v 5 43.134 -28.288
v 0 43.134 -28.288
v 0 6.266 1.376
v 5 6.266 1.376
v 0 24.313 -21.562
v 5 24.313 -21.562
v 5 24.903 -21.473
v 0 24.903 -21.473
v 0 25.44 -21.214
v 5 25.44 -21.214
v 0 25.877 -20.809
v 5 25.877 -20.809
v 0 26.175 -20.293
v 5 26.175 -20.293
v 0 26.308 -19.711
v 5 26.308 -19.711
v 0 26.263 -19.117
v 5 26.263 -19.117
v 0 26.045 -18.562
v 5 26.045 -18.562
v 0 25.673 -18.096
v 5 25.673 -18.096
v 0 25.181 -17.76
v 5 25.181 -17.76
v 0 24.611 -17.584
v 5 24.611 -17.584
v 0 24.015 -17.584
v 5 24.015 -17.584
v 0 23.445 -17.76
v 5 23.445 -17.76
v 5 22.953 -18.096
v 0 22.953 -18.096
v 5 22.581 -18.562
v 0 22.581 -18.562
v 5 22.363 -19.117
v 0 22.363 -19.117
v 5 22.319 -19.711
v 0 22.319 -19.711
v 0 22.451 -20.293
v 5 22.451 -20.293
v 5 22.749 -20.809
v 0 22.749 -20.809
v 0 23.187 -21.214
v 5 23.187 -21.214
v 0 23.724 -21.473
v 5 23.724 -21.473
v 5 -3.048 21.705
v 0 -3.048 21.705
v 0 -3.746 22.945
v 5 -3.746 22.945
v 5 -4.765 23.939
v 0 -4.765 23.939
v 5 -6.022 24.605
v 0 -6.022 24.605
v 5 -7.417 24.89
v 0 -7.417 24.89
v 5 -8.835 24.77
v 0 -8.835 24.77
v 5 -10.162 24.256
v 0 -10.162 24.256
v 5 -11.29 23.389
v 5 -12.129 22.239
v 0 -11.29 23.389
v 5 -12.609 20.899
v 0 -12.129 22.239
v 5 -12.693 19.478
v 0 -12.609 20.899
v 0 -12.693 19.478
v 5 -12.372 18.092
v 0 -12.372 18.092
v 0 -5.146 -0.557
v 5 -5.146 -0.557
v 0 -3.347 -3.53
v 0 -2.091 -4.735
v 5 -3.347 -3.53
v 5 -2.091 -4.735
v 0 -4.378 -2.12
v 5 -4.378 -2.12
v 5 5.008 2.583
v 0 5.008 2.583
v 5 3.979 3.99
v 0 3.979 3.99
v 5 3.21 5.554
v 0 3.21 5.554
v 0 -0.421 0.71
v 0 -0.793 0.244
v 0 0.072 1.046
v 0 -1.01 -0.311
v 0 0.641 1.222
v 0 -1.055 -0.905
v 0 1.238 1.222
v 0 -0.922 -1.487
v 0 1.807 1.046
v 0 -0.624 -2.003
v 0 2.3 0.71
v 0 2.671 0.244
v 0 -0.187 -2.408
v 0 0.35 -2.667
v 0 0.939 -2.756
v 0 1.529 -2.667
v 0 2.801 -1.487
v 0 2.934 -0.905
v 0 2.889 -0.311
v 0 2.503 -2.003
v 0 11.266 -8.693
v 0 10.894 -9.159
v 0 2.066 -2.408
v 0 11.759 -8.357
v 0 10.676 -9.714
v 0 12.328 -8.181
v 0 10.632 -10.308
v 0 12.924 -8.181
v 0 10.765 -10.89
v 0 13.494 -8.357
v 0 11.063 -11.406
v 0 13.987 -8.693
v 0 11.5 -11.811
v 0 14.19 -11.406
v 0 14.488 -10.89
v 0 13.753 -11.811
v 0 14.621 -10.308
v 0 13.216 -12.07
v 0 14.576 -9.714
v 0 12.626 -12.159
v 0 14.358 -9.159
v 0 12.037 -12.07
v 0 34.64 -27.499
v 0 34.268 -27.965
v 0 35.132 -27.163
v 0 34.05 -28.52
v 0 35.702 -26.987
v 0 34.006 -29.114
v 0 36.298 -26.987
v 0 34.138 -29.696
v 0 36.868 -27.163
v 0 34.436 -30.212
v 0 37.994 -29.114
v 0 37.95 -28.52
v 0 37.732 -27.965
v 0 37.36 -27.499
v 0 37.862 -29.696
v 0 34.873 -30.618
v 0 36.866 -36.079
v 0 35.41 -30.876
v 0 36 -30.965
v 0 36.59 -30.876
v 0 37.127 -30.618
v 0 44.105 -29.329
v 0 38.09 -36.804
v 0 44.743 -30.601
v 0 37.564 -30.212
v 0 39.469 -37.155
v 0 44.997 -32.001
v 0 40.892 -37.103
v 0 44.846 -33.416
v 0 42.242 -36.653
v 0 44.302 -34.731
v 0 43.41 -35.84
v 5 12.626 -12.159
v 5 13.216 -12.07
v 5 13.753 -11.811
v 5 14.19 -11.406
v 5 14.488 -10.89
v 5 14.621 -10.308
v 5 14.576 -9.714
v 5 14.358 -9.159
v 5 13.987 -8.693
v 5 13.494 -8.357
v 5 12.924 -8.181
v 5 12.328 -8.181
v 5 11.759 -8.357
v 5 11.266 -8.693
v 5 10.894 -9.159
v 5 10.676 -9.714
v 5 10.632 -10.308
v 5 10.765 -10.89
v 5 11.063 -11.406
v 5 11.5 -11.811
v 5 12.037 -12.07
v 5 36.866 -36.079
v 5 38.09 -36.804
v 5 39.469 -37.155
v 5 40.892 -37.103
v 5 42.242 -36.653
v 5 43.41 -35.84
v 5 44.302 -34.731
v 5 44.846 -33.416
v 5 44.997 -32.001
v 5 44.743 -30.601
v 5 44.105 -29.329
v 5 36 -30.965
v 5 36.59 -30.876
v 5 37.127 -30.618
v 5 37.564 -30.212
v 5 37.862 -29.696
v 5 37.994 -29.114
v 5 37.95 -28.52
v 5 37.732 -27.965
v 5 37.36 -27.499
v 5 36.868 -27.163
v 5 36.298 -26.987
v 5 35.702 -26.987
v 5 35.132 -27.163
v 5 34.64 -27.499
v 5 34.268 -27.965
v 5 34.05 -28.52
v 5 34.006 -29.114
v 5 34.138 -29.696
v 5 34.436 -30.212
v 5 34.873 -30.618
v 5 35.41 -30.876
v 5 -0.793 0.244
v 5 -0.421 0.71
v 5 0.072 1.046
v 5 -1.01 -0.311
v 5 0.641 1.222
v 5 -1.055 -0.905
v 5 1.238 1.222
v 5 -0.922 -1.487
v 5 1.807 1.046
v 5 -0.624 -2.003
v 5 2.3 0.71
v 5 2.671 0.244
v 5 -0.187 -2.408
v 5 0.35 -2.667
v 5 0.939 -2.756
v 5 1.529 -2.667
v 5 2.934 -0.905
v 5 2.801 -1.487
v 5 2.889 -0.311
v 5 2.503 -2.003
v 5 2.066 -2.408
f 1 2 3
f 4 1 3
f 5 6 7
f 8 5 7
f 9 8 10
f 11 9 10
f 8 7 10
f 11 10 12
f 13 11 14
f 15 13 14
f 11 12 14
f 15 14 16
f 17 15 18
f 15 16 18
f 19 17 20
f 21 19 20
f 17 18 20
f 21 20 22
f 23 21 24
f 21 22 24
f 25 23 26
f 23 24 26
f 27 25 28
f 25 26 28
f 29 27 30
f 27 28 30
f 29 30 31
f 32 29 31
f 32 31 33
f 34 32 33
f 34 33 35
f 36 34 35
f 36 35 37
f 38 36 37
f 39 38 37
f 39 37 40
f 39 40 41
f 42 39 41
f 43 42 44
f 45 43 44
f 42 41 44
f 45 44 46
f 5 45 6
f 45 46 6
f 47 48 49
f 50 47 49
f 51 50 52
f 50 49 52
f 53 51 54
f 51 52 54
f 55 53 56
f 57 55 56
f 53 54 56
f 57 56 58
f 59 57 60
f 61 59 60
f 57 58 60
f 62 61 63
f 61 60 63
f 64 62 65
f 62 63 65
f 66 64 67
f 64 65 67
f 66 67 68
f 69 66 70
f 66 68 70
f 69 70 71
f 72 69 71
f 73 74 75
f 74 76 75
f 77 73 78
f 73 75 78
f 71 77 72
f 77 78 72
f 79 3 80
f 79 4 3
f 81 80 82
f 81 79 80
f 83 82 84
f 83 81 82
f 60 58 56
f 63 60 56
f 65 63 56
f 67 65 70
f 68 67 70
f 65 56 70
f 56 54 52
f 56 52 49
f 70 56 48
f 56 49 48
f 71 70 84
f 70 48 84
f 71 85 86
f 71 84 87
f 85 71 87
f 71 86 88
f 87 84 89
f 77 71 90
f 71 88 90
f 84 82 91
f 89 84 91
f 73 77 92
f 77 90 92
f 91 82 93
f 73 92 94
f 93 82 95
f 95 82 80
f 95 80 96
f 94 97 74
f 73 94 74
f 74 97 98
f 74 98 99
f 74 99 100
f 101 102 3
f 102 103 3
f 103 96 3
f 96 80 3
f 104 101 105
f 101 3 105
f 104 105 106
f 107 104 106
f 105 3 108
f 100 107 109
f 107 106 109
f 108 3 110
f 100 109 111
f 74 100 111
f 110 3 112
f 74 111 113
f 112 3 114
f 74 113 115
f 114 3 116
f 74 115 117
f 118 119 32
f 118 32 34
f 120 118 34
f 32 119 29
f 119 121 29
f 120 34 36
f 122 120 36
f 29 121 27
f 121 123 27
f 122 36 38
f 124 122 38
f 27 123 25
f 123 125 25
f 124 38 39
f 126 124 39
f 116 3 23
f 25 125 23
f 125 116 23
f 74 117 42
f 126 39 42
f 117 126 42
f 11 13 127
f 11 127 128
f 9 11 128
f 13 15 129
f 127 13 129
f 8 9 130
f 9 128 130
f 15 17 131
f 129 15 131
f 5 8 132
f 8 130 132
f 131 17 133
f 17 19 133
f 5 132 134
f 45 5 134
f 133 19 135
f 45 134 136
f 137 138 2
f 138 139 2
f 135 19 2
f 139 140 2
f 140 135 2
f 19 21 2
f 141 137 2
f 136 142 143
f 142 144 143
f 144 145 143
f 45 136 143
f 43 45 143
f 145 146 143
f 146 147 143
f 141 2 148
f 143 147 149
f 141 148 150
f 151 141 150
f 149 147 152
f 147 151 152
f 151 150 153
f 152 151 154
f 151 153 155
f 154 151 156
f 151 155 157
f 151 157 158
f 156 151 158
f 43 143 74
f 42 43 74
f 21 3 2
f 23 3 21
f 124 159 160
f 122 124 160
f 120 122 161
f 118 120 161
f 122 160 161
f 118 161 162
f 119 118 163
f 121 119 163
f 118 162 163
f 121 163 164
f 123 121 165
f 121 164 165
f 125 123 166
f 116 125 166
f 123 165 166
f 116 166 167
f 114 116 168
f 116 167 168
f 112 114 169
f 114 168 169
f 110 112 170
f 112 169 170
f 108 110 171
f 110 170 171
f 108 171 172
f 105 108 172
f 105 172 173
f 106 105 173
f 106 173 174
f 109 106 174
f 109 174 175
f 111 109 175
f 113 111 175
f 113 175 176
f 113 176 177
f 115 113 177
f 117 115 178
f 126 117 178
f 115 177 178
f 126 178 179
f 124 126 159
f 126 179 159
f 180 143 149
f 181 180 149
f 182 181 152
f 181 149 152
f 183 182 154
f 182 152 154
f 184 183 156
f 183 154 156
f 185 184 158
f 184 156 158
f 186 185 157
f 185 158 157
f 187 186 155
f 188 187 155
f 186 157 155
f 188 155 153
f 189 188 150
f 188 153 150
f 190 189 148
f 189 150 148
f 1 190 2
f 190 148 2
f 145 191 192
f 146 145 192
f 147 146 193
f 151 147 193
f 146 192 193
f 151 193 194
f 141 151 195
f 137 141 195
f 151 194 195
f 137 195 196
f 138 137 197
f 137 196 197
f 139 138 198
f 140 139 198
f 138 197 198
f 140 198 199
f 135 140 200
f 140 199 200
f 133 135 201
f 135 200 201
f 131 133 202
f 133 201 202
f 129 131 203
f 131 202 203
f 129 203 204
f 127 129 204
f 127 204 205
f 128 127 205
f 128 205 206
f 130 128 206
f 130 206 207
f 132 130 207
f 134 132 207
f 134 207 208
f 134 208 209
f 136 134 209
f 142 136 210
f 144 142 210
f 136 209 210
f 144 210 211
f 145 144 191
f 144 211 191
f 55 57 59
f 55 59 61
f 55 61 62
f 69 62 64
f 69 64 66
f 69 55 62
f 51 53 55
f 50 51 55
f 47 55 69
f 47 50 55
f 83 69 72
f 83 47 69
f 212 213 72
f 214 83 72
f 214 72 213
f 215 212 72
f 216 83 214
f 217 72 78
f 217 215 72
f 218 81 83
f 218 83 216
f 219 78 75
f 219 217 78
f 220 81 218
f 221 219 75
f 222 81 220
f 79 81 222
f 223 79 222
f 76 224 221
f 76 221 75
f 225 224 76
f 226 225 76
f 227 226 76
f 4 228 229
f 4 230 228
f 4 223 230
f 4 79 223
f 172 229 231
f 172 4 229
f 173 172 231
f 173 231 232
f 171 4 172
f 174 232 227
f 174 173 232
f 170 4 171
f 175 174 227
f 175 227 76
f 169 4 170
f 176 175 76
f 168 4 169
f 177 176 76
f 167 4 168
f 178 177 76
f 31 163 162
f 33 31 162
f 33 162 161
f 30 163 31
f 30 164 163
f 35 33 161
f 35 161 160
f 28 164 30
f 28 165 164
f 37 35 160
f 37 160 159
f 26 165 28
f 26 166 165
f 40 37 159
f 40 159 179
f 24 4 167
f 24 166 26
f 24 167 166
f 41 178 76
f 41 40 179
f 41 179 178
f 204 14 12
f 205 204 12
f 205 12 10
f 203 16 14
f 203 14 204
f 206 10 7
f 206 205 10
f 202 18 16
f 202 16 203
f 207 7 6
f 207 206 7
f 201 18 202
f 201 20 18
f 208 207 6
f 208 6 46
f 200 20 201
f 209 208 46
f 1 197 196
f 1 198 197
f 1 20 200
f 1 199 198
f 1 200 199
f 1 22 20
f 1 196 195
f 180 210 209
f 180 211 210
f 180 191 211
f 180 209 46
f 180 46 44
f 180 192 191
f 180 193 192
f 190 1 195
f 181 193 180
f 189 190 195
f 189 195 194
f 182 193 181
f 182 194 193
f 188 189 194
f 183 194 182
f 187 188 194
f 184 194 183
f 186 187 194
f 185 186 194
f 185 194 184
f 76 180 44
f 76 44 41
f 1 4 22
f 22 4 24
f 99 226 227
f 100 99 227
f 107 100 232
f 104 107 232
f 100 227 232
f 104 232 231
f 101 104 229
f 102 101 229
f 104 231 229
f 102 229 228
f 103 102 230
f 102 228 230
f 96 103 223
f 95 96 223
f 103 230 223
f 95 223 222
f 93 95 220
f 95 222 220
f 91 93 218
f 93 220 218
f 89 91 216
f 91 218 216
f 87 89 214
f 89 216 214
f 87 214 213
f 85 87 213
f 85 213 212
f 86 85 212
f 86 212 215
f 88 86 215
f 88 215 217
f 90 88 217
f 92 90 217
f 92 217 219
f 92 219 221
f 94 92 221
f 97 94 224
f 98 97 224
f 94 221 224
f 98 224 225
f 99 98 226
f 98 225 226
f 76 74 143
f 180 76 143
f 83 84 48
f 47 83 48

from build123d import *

# Parameters (mm, degrees)
BOSS_EXTRUDE1_DEPTH = 5
SKETCH2_R           = 2
CUT_EXTRUDE1_DEPTH  = 5
FILLET1_R           = 10
FILLET2_R           = 10


with BuildPart() as part:
    # Sketch1 → Boss-Extrude1 (new body)
    with BuildSketch(Plane(origin=(0, 0, 0), x_dir=(0, 0, -1), z_dir=(1, 0, 0))):
        with BuildLine():
            Line((3.89561725, -3.134352603), (36.078990527, 36.865647397))
            ThreePointArc((36.078990527, 36.865647397), (35.317725879, 43.89561725), (28.287756026, 43.134352603))
            Line((28.287756026, 43.134352603), (-3.055770002, 4.178180099))
            Line((-3.055770002, 4.178180099), (-21.704720416, -3.047928704))
            ThreePointArc((-21.704720416, -3.047928704), (-24.560430819, -9.516693509), (-18.091666014, -12.372403912))
            Line((-18.091666014, -12.372403912), (1.806527201, -4.662237604))
            Line((1.806527201, -4.662237604), (3.055770002, -4.178180099))
            Line((3.055770002, -4.178180099), (3.89561725, -3.134352603))
        make_face()
    extrude(amount=BOSS_EXTRUDE1_DEPTH)

    # Sketch2 → Cut-Extrude1 (cut)
    with BuildSketch(Plane(origin=(5, 0, 0), x_dir=(0, 0, -1), z_dir=(1, 0, 0))):
        with Locations((28.965035949, 36)):
            Circle(SKETCH2_R)
        with Locations((19.561978141, 24.313148249)):
            Circle(SKETCH2_R)
        with Locations((10.158920332, 12.626296498)):
            Circle(SKETCH2_R)
        with Locations((0.755862524, 0.939444747)):
            Circle(SKETCH2_R)
    extrude(amount=-CUT_EXTRUDE1_DEPTH, mode=Mode.SUBTRACT)

    # Fillet1
    fillet1_edges = [part.edges().sort_by_distance(p)[0] for p in [
        (2.5, 4.178180099, 3.055770002),
    ]]
    fillet(fillet1_edges, radius=FILLET1_R)

    # Fillet2
    fillet2_edges = [part.edges().sort_by_distance(p)[0] for p in [
        (2.5, -4.178180099, -3.055770002),
    ]]
    fillet(fillet2_edges, radius=FILLET2_R)


solid = part.part
